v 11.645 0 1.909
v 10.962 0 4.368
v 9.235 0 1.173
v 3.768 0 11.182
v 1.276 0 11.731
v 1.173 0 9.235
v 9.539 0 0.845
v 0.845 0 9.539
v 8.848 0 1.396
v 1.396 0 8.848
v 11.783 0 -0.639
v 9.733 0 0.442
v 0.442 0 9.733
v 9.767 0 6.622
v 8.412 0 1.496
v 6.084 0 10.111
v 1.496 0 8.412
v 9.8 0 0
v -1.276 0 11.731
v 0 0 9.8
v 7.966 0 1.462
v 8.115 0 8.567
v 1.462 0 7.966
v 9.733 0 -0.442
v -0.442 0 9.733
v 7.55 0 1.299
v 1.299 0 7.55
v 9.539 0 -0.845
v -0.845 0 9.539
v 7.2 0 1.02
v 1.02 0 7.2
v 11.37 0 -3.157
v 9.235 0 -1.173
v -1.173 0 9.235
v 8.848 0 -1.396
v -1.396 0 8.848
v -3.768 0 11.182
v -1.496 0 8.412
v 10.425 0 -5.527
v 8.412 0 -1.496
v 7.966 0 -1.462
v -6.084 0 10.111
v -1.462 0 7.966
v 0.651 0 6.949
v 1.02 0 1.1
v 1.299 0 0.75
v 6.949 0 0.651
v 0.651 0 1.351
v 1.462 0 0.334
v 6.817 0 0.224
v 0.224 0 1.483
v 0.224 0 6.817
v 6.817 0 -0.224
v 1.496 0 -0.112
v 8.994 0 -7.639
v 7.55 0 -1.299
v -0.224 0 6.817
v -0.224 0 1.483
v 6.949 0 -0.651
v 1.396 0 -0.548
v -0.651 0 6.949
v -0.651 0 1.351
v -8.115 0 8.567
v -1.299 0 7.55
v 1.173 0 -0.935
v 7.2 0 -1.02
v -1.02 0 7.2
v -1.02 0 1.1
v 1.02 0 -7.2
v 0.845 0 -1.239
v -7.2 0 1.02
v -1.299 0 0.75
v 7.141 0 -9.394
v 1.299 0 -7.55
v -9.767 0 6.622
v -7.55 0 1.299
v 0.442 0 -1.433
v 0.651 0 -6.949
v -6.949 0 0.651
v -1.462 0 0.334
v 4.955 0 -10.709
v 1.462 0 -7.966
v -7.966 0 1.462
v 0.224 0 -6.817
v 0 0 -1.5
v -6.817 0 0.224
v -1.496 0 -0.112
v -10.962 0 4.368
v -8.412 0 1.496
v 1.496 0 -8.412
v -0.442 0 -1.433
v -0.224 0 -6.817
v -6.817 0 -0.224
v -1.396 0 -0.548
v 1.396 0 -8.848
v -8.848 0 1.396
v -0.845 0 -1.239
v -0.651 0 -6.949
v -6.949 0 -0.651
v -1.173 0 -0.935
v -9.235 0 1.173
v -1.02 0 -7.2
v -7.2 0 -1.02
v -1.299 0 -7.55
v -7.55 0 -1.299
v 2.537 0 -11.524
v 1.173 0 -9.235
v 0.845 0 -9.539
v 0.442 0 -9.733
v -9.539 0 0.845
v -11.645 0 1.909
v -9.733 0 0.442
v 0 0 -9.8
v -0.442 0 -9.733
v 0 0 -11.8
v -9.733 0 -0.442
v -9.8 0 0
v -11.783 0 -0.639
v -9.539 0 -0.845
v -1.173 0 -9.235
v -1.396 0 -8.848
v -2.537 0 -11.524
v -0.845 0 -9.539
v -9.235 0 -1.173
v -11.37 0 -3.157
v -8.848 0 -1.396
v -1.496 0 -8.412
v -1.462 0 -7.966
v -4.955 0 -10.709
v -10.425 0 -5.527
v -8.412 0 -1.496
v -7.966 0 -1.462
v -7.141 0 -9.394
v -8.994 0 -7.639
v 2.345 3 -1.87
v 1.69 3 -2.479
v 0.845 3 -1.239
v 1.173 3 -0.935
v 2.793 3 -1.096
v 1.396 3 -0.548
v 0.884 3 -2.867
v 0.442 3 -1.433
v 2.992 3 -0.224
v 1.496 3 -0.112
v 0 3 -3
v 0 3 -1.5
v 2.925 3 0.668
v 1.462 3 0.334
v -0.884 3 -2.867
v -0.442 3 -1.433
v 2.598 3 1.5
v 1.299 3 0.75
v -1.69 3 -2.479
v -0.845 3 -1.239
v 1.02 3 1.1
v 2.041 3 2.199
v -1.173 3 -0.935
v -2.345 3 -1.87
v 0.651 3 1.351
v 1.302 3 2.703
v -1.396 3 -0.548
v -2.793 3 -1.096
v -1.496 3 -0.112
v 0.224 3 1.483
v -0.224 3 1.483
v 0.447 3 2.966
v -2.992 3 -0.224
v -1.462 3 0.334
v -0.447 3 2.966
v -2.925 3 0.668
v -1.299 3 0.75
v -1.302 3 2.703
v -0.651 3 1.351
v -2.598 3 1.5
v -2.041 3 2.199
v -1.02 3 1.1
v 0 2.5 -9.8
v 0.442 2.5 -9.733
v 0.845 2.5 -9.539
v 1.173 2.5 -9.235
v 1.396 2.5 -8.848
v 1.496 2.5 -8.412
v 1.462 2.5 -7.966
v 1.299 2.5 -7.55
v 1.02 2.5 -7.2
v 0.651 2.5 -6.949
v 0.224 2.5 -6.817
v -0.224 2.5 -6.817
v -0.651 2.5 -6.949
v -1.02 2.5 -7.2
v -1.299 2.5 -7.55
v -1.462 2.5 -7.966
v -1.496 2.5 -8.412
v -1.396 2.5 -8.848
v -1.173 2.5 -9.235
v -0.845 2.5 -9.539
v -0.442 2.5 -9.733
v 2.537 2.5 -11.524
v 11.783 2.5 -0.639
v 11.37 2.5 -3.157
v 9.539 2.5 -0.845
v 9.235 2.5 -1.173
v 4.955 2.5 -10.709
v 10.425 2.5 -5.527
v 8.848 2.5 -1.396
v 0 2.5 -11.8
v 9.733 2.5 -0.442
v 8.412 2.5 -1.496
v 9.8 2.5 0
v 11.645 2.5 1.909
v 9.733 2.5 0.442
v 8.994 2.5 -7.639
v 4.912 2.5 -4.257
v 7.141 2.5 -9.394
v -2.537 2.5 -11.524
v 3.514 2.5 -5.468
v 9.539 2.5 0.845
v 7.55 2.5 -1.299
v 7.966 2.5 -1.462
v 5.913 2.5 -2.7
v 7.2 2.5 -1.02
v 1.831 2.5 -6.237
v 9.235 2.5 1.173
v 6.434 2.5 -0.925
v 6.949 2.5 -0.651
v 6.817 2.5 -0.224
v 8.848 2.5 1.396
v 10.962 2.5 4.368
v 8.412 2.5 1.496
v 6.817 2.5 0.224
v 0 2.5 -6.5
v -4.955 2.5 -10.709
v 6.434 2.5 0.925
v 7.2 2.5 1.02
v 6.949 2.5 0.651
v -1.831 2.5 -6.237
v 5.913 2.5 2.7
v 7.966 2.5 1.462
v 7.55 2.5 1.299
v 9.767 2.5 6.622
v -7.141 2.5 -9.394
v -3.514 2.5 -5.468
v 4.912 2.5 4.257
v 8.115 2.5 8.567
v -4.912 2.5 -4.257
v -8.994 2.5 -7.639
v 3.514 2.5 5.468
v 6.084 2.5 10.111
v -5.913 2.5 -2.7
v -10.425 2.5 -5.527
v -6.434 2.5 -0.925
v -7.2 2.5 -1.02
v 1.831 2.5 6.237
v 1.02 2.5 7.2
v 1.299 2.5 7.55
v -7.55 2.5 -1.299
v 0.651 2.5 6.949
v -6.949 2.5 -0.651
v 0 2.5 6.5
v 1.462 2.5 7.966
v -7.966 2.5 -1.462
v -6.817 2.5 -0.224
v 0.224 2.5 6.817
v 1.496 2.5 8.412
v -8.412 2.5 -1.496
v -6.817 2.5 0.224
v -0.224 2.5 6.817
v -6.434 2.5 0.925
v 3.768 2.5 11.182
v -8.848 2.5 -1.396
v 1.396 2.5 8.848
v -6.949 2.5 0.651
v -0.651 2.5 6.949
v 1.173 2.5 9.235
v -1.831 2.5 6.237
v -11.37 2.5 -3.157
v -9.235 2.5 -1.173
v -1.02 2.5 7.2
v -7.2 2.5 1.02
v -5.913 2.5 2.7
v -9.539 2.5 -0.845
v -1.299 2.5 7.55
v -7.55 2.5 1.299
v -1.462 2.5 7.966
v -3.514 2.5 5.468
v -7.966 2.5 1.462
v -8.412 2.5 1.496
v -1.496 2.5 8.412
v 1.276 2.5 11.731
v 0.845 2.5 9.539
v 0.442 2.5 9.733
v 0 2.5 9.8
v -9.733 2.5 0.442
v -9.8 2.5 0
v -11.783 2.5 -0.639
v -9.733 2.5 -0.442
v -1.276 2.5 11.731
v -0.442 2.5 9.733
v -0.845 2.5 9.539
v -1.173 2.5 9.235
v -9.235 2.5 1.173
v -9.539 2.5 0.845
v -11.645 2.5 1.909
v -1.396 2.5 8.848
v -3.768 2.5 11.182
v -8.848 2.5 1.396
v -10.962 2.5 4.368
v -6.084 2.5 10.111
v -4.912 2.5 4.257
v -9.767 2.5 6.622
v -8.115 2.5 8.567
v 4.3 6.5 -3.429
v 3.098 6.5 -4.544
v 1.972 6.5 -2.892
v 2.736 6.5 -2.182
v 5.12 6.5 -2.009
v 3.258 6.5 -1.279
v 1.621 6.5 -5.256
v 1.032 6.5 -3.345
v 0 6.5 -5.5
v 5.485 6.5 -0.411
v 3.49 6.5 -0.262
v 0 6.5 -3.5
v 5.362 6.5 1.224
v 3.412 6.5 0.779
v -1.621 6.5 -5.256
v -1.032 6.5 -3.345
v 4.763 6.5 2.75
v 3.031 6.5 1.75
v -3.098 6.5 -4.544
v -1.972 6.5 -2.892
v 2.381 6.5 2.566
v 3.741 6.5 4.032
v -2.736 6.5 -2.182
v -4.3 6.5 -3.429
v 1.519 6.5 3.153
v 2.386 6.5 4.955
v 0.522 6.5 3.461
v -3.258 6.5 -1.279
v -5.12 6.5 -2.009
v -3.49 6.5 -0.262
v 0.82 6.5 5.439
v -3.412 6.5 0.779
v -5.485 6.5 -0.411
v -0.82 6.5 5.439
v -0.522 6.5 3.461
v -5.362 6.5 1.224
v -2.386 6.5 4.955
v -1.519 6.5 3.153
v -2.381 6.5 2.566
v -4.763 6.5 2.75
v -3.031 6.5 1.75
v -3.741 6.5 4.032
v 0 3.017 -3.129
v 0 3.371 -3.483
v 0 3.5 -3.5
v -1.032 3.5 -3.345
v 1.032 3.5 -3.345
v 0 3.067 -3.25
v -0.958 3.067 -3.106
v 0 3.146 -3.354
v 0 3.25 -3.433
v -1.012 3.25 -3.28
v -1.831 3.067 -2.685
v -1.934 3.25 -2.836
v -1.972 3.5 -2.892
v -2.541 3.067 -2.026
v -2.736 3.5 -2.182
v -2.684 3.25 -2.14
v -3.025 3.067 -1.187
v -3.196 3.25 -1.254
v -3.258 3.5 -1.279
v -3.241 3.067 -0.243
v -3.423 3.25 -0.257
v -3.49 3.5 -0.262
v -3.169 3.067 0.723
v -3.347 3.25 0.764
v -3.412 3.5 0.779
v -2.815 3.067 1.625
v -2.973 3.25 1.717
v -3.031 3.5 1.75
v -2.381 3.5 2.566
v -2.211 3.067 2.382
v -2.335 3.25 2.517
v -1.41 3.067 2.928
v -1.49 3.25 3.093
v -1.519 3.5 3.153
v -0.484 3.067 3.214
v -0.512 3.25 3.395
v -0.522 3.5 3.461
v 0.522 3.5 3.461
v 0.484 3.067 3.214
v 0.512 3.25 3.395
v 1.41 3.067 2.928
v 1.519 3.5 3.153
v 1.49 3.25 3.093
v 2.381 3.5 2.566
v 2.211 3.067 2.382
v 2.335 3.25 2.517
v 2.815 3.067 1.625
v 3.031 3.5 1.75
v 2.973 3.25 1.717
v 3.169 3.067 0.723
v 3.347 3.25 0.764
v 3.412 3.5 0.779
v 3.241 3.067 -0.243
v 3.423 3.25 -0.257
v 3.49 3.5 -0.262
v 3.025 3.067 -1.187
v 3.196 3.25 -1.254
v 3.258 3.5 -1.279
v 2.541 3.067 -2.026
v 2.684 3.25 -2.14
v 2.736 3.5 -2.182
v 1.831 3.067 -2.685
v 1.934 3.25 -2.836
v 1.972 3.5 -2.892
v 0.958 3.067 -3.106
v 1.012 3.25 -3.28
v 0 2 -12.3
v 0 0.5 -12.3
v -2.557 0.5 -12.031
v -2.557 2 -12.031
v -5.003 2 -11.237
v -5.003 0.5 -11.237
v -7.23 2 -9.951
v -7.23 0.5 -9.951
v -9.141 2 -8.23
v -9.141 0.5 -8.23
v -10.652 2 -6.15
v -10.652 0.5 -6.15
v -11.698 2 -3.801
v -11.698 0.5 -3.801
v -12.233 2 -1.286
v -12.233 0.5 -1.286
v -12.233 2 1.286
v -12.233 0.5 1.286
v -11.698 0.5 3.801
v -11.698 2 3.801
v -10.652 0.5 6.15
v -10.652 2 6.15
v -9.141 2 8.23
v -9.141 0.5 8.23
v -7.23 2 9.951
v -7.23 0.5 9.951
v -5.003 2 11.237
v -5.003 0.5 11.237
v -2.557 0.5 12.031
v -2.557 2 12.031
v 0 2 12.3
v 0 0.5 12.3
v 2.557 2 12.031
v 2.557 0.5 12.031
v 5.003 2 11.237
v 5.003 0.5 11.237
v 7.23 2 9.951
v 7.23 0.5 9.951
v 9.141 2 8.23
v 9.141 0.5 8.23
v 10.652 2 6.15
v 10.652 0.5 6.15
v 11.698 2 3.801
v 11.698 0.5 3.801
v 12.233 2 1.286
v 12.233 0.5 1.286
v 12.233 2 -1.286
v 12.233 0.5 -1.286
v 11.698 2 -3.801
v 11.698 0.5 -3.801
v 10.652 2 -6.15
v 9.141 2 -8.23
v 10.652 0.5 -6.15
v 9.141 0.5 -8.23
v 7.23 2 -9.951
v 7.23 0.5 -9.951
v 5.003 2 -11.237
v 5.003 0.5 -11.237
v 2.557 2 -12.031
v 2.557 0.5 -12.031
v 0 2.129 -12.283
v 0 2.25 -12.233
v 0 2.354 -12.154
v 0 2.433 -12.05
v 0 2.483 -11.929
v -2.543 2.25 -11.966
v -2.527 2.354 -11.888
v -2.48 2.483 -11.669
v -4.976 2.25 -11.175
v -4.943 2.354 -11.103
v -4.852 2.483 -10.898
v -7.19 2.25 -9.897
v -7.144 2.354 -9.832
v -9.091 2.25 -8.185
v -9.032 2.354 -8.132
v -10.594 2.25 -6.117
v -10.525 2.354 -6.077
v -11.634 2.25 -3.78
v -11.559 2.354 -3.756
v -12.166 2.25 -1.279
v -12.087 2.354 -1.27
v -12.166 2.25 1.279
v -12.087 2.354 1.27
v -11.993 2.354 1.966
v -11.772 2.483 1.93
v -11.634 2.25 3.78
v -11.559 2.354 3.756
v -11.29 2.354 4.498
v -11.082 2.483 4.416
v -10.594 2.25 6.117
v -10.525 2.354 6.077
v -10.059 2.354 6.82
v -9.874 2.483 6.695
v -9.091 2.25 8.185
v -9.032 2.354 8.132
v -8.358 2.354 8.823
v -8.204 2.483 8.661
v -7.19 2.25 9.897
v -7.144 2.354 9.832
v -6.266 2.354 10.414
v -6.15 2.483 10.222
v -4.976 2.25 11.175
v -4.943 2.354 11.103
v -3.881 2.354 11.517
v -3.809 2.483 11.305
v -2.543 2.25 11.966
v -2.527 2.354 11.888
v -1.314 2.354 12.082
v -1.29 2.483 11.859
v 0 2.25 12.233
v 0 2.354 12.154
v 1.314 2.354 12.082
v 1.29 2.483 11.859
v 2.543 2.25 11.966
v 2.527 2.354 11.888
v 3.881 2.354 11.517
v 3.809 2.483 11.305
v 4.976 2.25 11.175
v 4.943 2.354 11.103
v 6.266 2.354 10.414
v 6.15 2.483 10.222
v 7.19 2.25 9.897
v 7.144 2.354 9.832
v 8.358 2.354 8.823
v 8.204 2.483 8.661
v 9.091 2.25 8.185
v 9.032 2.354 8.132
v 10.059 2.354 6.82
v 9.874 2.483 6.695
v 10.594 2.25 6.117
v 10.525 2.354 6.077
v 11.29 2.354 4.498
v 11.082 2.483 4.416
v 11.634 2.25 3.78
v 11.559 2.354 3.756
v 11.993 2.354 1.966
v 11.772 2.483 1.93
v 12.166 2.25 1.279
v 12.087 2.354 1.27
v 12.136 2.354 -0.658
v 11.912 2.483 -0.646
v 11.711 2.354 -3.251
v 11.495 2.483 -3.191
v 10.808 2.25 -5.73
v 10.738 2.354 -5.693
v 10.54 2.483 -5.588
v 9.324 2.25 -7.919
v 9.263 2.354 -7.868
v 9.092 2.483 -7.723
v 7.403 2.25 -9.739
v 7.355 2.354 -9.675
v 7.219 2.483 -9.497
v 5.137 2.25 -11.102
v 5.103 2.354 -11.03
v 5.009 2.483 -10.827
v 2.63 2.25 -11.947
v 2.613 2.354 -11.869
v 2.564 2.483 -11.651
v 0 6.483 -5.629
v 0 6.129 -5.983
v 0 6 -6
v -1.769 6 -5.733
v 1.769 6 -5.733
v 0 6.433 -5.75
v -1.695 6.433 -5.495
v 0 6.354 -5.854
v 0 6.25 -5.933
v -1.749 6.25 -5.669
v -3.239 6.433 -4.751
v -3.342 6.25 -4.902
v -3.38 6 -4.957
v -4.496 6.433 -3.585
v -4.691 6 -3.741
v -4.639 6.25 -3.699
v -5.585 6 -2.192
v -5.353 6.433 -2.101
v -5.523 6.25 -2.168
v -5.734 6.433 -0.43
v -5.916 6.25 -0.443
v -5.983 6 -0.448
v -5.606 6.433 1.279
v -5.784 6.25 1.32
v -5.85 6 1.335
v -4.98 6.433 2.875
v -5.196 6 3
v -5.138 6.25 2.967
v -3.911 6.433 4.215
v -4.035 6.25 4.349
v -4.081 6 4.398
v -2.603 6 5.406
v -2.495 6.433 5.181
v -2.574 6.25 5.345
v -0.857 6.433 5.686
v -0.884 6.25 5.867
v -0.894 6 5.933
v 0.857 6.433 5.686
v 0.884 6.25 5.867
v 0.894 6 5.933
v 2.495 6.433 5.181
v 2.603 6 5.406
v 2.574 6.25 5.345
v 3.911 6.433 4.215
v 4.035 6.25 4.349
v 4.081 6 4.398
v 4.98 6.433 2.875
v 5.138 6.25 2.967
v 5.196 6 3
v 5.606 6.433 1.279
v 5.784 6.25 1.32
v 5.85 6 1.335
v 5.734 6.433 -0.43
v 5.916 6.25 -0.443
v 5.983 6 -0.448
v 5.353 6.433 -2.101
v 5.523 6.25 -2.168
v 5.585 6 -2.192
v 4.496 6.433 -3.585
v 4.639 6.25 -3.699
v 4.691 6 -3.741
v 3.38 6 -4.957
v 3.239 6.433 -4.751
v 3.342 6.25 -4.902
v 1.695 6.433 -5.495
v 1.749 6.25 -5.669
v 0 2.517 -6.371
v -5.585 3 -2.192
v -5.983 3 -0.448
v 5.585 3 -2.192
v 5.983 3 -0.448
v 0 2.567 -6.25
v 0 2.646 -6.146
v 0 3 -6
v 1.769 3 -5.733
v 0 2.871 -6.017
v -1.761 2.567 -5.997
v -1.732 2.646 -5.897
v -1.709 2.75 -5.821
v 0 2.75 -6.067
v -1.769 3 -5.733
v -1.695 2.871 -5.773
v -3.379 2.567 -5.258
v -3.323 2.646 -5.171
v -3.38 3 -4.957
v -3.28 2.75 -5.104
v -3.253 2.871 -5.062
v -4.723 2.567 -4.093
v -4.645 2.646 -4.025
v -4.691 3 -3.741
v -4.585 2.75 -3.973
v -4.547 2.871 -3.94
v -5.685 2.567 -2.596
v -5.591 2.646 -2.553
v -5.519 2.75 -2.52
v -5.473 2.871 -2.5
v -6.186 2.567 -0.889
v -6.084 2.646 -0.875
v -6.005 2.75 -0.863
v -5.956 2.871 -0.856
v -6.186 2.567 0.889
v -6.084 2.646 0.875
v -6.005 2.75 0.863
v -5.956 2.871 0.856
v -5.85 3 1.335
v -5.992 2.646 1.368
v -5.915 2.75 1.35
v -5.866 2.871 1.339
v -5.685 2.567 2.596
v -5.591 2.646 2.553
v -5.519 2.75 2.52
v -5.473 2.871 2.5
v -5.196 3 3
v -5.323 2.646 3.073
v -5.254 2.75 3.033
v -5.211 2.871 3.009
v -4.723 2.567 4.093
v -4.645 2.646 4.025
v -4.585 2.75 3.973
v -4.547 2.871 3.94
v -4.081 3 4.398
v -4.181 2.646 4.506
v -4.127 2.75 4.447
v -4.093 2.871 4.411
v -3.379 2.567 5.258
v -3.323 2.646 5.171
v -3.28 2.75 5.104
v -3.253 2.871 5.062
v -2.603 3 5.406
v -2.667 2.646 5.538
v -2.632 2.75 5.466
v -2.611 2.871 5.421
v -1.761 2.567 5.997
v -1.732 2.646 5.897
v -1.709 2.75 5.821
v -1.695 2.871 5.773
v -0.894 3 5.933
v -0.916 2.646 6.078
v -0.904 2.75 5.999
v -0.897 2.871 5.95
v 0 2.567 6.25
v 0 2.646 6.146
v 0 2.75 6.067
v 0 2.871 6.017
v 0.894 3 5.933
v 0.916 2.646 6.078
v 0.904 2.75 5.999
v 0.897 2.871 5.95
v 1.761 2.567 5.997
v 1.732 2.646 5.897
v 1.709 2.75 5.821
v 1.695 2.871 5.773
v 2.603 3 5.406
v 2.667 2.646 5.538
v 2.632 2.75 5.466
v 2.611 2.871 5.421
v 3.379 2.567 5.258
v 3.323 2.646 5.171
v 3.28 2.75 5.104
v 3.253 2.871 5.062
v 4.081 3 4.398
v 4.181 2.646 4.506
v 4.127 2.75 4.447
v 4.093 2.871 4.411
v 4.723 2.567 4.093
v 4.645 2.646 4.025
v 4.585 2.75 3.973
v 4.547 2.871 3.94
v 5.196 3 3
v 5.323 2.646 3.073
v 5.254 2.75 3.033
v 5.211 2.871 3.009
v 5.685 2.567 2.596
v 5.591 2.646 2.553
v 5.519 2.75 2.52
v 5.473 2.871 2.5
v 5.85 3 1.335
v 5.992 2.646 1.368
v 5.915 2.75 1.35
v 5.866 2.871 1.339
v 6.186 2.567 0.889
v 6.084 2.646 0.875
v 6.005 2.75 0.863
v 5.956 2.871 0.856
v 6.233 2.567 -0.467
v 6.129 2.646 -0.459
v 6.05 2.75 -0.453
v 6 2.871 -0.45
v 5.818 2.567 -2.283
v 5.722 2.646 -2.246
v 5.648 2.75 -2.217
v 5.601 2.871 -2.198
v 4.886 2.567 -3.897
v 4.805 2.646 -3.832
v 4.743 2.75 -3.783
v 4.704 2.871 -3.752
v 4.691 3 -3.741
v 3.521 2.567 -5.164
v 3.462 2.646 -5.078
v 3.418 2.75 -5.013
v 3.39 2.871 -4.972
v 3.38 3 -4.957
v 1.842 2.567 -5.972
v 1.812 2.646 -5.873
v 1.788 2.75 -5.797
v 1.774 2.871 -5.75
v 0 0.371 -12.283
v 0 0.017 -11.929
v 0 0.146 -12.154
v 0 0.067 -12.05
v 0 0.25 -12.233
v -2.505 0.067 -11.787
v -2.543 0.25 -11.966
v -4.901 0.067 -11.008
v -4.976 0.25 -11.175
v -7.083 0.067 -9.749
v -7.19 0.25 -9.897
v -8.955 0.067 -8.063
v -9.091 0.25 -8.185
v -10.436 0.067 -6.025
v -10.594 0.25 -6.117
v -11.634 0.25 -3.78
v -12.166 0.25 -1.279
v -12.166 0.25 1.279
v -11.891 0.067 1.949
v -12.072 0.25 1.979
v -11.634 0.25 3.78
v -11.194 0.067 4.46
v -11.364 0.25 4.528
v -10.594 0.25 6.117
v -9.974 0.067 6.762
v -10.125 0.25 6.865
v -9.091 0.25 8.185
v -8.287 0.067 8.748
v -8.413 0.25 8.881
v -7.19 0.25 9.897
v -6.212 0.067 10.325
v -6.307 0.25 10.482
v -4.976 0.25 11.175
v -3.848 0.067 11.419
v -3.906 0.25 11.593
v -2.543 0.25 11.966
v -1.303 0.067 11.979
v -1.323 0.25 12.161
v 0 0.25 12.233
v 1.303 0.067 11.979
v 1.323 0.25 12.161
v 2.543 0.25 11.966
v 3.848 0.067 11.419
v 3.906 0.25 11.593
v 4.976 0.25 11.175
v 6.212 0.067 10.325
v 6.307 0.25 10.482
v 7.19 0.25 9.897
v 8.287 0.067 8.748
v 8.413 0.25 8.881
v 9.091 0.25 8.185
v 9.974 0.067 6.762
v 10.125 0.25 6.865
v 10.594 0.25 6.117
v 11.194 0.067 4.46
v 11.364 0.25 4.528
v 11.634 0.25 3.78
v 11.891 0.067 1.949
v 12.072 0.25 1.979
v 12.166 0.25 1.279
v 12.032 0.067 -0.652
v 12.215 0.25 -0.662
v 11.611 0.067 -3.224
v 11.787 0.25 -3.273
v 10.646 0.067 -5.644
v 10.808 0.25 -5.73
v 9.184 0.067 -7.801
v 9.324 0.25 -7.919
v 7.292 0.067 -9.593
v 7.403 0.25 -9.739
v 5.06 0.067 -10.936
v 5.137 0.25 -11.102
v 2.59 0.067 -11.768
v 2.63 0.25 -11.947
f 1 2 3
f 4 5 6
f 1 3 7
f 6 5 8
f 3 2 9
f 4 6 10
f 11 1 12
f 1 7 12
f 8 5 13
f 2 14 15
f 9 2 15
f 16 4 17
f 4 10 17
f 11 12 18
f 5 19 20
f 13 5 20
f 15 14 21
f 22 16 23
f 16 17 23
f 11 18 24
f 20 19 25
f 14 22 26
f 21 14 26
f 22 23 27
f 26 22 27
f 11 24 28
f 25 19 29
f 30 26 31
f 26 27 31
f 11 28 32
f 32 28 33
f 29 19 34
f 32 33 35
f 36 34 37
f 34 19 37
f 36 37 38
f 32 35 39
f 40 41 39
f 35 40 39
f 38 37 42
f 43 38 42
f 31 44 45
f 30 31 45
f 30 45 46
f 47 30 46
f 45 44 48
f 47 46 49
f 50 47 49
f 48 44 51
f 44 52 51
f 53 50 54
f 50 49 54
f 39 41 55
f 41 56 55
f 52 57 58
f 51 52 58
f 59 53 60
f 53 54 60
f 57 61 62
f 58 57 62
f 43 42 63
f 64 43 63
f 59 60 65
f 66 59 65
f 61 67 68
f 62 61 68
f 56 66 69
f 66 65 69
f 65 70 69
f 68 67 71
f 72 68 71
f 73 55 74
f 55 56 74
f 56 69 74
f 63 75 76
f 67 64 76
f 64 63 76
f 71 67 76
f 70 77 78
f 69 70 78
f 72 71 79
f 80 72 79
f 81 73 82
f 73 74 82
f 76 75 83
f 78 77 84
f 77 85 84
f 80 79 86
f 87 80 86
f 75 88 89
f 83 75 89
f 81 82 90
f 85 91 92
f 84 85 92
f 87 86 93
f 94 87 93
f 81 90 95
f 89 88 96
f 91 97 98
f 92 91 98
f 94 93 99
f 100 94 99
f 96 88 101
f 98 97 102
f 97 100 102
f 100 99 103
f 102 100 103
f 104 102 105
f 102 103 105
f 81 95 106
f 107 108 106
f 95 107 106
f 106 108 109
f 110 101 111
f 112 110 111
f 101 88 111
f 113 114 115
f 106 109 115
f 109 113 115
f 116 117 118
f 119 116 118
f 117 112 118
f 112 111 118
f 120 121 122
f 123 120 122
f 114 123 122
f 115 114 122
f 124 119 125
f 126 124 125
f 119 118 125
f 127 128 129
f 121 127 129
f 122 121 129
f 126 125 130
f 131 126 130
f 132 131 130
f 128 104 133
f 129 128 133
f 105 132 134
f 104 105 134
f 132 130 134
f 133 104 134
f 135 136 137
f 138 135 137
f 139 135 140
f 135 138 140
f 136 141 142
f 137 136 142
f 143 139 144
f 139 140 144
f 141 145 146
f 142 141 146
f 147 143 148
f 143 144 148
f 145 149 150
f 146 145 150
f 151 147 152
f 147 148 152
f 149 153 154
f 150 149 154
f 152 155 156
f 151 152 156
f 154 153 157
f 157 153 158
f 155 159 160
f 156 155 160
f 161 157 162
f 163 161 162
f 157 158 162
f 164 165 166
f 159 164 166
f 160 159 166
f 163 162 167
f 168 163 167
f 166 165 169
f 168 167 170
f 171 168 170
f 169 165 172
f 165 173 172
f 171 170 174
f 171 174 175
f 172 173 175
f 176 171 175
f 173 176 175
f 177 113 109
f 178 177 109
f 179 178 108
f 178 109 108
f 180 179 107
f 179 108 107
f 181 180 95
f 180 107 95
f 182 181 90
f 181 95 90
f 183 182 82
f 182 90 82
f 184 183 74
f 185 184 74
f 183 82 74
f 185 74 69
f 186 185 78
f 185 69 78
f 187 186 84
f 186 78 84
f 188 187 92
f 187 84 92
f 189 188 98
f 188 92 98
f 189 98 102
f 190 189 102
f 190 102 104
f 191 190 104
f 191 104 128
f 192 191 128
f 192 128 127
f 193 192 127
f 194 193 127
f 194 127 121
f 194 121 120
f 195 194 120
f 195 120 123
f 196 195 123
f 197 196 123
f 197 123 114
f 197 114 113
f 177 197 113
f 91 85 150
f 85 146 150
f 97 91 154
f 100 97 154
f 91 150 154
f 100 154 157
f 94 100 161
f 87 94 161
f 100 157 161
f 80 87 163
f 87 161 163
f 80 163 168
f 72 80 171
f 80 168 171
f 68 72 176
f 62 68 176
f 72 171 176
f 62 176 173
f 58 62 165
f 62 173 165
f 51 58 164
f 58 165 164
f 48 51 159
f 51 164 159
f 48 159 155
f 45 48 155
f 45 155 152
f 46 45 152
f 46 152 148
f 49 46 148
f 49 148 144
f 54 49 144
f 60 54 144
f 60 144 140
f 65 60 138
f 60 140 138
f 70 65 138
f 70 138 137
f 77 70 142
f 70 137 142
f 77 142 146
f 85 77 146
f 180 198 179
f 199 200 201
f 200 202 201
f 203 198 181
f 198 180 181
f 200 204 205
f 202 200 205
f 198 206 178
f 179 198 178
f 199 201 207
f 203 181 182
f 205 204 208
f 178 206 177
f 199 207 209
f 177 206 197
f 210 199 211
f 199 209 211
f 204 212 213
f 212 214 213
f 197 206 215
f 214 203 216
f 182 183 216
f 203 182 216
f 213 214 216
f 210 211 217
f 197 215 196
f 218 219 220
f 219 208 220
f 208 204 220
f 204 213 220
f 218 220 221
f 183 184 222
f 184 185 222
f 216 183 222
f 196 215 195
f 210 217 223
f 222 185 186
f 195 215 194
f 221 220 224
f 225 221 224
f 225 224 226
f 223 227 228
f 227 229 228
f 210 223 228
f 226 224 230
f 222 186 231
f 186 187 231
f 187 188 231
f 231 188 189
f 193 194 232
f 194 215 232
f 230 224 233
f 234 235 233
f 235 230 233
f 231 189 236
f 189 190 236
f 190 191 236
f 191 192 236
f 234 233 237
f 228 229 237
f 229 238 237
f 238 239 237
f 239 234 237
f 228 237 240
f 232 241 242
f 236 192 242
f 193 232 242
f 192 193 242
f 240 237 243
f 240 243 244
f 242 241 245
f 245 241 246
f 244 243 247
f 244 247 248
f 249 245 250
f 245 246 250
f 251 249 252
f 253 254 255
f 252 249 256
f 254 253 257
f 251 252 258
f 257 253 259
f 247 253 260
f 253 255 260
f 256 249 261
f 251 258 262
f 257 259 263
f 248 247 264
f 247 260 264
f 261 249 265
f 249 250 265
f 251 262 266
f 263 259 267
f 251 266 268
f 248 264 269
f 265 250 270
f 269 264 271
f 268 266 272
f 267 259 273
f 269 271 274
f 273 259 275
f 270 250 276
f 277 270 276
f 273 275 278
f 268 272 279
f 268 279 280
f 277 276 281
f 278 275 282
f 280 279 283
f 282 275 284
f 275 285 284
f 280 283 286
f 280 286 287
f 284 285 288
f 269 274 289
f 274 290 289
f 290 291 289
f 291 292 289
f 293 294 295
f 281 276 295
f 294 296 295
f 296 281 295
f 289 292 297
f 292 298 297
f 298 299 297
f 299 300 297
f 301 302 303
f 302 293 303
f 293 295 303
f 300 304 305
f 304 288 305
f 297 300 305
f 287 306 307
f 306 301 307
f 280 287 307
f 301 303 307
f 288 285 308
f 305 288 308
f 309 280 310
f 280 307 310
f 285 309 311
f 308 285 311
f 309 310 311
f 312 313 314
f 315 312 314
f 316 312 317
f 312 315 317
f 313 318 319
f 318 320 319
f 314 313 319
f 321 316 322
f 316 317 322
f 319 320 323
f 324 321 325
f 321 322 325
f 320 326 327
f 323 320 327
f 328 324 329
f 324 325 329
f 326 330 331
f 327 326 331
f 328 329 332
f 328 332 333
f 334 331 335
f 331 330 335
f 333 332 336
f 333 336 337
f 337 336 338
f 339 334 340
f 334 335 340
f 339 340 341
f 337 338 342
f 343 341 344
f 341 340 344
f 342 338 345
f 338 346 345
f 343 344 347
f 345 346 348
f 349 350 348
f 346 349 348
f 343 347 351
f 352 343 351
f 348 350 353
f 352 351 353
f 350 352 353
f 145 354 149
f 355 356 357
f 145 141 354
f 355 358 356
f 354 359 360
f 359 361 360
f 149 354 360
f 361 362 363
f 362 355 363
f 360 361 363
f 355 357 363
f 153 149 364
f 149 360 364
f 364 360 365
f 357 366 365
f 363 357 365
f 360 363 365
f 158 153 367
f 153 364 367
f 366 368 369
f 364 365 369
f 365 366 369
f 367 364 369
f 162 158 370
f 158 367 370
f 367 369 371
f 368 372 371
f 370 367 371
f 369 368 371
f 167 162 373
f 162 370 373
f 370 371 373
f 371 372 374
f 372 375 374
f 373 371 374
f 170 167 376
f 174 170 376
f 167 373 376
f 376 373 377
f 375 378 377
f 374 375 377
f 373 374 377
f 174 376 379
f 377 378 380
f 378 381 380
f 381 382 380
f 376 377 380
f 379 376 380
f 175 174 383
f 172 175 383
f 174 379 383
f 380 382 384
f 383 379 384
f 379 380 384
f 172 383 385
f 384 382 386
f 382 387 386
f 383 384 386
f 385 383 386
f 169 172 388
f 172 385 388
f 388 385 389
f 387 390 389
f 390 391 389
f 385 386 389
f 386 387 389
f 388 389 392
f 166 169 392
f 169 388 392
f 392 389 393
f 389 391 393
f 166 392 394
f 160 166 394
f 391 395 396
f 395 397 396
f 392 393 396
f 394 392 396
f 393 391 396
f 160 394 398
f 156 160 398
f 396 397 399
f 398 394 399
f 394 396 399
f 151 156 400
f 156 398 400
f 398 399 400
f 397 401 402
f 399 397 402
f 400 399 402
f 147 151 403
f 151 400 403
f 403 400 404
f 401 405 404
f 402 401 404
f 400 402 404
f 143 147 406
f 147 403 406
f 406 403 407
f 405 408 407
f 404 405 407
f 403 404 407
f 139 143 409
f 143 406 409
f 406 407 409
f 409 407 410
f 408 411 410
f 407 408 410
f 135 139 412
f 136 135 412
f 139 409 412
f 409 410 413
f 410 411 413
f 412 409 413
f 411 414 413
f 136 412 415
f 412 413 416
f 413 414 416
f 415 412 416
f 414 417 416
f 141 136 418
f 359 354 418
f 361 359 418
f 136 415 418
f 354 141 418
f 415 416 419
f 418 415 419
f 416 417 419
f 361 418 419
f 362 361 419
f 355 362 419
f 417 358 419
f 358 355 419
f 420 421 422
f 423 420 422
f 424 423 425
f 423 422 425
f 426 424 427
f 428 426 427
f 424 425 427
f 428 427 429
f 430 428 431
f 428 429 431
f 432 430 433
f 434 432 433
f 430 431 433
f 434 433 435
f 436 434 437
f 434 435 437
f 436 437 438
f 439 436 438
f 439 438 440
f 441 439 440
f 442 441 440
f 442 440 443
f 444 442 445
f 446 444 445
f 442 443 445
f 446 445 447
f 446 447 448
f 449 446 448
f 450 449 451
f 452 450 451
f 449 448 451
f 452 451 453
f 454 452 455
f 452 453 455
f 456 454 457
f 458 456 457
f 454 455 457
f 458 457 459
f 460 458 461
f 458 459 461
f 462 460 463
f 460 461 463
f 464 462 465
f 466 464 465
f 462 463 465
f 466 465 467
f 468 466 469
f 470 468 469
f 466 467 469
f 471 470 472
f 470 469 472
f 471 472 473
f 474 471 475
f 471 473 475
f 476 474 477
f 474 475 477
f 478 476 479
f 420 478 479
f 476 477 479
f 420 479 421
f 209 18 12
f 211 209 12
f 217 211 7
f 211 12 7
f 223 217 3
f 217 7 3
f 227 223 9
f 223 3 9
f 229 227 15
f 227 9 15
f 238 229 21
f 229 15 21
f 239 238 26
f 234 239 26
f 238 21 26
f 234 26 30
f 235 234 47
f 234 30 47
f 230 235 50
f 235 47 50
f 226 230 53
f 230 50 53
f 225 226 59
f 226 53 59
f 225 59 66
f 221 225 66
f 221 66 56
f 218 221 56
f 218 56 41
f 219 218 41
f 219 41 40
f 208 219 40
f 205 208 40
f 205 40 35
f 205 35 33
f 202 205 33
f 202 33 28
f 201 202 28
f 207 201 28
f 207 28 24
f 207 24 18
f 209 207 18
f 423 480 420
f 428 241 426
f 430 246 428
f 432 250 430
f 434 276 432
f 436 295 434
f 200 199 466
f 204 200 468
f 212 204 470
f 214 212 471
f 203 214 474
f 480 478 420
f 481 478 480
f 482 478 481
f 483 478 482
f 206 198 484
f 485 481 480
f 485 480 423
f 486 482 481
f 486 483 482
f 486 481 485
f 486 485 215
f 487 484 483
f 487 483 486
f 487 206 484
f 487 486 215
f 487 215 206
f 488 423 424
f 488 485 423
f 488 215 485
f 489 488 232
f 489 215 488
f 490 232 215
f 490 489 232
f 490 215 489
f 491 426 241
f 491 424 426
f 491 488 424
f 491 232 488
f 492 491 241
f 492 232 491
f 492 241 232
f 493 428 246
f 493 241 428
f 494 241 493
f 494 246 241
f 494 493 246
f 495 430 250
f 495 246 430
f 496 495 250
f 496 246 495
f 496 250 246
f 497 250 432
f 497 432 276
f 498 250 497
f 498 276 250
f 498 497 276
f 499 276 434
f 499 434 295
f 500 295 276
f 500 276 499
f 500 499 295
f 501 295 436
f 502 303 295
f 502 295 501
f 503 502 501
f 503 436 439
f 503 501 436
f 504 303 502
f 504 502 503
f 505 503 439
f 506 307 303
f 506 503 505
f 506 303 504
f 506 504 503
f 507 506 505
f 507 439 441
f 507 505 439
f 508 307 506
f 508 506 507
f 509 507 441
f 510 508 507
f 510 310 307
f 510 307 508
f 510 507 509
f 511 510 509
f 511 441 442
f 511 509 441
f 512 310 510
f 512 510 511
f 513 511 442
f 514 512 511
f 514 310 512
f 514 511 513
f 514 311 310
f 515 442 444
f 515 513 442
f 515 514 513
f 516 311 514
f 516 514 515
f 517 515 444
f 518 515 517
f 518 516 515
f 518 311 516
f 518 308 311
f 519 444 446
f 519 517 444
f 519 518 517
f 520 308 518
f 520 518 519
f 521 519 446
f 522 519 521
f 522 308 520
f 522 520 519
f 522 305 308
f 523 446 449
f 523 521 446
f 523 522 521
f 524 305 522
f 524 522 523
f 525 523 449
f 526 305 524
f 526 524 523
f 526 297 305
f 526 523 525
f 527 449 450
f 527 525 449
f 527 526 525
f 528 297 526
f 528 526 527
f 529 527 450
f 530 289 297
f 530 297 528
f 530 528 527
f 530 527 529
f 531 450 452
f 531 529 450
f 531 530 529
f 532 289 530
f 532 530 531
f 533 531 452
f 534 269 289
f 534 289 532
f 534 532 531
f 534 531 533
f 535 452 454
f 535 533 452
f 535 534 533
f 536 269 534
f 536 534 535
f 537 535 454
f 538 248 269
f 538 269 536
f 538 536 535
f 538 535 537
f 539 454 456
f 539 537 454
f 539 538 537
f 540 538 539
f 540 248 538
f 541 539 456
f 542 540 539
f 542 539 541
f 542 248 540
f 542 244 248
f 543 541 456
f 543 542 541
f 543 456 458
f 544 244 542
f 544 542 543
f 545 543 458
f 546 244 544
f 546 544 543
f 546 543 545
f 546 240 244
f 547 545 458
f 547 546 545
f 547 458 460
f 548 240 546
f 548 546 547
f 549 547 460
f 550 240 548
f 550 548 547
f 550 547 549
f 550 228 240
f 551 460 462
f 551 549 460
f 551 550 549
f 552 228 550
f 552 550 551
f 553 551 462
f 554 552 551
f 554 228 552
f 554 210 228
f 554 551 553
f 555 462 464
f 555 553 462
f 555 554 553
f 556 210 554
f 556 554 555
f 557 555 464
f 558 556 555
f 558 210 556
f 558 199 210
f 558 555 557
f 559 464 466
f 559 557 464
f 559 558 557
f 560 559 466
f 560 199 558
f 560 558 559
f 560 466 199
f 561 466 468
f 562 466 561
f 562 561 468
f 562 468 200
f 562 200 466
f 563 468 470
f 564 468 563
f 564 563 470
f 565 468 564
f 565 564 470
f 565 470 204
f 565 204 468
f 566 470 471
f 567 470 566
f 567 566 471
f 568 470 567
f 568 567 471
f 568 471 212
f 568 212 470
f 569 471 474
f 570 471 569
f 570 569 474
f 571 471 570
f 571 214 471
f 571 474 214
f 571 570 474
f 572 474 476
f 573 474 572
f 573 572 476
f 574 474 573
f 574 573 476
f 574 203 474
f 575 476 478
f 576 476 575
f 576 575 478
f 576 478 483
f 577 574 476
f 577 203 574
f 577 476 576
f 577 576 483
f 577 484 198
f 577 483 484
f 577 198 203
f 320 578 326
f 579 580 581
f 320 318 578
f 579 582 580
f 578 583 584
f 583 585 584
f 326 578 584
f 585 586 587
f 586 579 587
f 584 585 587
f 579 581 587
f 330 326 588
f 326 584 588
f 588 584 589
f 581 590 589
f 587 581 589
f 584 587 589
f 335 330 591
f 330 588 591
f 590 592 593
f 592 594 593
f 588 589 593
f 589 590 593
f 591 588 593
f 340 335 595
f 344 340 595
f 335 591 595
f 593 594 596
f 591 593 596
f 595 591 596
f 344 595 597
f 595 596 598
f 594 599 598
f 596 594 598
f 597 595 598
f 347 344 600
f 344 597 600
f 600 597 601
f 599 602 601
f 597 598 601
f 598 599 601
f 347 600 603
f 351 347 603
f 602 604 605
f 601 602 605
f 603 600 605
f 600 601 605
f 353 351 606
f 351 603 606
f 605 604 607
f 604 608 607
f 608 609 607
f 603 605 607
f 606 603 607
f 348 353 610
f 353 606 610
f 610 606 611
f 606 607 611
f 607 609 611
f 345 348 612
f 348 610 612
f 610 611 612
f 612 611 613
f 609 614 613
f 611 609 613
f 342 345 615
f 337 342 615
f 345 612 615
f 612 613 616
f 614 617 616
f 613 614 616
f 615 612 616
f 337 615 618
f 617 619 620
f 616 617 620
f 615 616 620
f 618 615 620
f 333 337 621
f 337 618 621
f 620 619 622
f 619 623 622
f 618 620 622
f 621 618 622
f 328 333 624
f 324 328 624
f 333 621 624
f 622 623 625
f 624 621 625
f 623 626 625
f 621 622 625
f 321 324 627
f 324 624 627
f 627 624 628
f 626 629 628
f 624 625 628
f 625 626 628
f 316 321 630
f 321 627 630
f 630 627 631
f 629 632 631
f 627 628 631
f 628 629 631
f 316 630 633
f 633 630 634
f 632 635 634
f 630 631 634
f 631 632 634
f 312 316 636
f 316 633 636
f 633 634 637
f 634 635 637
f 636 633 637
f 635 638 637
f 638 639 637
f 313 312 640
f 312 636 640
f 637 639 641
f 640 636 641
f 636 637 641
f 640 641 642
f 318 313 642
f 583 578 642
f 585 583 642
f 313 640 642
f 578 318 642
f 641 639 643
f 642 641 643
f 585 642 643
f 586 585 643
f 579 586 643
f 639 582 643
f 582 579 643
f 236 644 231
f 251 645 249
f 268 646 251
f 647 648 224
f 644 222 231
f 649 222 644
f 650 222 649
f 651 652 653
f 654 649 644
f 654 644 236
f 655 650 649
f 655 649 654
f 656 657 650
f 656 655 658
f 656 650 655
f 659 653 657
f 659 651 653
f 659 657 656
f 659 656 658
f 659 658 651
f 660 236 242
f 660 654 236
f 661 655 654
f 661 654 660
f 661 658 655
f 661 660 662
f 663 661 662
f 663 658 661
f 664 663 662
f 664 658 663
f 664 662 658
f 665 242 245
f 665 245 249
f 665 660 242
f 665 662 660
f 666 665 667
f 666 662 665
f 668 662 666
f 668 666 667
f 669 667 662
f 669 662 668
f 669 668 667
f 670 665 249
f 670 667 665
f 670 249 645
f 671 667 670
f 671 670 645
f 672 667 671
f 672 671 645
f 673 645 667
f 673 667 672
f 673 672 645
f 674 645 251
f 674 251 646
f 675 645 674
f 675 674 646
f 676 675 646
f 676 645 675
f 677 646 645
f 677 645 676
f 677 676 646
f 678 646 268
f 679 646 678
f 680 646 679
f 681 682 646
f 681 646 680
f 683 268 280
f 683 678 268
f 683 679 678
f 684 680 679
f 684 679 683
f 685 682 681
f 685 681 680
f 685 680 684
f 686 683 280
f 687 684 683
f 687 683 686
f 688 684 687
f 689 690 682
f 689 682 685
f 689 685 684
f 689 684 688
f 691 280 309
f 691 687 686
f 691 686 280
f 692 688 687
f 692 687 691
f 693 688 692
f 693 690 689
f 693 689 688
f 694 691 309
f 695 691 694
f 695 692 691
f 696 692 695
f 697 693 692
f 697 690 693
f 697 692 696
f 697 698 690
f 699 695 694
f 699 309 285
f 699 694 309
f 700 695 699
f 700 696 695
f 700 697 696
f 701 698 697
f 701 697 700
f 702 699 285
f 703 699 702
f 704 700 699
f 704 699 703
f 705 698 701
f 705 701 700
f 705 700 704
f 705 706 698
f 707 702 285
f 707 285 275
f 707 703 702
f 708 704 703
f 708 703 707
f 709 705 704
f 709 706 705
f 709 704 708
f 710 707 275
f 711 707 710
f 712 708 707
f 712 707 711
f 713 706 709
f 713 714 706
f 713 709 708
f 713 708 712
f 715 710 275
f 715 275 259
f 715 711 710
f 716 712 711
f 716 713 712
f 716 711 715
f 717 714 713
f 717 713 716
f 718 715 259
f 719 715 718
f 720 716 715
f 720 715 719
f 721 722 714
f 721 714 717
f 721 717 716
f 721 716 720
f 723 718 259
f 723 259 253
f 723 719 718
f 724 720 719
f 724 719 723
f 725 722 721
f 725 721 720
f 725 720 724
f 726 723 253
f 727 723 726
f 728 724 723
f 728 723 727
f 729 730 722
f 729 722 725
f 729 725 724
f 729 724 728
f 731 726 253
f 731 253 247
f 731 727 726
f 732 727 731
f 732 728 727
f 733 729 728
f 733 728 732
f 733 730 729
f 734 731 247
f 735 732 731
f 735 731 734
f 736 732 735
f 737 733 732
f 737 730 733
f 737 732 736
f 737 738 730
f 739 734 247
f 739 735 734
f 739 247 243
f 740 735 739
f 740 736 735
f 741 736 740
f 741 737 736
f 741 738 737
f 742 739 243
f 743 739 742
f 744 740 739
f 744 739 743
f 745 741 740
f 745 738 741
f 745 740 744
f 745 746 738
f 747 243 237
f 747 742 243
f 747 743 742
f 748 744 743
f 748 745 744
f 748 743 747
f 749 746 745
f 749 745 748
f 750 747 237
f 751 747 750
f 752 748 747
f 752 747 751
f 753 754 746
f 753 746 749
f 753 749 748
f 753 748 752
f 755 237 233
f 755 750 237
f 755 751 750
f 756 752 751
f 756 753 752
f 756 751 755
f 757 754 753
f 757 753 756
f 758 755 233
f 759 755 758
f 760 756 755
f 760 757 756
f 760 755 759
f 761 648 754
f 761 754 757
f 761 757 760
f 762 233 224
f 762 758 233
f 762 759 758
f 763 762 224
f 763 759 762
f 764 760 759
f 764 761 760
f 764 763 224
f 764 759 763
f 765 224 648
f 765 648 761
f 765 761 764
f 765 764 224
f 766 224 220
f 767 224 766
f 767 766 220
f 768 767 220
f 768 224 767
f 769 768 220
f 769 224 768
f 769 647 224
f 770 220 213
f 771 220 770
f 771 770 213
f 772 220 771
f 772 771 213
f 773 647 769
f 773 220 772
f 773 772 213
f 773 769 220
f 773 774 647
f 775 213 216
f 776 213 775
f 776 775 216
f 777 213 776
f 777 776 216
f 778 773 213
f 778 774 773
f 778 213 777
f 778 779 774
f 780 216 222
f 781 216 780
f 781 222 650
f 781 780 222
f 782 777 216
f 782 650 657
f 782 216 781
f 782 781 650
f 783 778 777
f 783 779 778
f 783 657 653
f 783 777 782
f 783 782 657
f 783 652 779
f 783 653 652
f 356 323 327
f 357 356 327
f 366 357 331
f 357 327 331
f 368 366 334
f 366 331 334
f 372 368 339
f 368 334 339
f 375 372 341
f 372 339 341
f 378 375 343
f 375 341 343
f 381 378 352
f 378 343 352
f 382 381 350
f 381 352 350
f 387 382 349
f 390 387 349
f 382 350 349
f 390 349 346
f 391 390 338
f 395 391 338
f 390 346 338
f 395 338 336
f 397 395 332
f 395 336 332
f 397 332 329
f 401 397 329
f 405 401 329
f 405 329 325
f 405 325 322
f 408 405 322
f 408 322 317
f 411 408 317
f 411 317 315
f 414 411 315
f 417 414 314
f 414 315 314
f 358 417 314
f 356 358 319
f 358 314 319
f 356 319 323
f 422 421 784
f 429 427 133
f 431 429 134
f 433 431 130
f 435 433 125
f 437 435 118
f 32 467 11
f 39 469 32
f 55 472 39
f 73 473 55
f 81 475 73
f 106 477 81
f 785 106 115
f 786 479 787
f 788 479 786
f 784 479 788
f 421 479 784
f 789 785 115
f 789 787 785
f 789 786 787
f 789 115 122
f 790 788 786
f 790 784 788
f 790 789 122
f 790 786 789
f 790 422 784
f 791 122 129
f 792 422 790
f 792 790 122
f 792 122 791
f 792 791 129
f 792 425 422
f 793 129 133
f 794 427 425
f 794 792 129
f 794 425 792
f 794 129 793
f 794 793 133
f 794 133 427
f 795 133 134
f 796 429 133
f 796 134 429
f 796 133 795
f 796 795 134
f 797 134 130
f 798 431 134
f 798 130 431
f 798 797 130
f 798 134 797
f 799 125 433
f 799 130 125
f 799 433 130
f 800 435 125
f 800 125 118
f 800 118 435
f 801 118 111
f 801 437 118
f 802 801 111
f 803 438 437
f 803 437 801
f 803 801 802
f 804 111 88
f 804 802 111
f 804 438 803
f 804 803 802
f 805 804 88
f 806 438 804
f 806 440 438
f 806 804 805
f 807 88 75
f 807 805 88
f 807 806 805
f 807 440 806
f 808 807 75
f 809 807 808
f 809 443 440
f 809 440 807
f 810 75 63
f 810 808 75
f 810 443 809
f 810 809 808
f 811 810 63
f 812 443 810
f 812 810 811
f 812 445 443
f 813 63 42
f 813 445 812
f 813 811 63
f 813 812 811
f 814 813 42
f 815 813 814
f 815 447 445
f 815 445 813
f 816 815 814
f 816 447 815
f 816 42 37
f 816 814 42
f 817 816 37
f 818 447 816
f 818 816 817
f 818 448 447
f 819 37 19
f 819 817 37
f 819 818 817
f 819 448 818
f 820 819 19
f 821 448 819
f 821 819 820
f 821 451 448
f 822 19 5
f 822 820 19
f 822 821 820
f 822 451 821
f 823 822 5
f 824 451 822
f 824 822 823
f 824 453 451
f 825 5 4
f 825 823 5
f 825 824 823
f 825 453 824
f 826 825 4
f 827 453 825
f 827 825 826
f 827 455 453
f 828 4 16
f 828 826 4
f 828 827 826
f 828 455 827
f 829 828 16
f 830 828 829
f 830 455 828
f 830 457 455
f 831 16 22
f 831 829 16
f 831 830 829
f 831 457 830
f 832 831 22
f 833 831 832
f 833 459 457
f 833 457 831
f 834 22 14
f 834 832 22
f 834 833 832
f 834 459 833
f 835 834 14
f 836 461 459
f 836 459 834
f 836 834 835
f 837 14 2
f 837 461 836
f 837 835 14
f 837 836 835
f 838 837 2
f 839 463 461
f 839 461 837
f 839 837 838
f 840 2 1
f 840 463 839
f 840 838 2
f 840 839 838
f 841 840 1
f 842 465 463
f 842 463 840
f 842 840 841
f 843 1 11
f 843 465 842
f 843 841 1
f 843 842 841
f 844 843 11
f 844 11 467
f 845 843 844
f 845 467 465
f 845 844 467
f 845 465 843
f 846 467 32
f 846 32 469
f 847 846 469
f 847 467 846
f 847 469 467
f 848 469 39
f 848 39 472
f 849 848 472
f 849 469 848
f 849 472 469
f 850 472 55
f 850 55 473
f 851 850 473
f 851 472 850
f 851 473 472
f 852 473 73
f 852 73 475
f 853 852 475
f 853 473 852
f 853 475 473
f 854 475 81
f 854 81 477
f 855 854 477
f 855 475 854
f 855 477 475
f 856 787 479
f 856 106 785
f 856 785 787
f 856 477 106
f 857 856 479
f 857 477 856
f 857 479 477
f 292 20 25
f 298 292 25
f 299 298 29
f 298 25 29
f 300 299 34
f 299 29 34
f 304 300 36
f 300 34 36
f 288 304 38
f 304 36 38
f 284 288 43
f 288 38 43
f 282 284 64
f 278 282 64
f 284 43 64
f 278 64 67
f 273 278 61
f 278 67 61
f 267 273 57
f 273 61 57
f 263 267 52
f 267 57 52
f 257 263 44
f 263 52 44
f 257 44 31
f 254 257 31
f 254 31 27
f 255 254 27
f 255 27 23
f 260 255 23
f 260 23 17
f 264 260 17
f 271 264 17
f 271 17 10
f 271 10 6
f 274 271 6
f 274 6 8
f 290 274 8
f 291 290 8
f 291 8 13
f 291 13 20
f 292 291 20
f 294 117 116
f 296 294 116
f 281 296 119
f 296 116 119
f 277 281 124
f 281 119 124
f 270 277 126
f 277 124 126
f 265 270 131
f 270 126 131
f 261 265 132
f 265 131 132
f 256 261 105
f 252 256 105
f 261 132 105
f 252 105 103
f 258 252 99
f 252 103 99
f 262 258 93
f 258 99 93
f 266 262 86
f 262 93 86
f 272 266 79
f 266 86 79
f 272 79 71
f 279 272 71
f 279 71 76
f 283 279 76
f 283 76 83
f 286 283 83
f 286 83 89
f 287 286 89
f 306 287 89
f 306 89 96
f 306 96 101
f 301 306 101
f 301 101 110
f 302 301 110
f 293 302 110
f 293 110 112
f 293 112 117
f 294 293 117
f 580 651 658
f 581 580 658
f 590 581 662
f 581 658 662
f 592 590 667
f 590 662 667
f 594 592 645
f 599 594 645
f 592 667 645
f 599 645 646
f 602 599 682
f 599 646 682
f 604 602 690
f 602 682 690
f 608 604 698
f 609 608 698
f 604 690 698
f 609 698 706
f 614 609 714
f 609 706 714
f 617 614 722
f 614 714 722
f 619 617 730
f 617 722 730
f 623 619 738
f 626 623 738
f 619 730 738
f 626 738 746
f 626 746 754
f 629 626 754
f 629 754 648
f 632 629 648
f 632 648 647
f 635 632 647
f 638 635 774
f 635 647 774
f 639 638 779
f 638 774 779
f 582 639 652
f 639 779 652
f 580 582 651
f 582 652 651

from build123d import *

# Parameters (mm, degrees)
SKETCH2_R          = 1.5
CUT_EXTRUDE1_DEPTH = 10
CIRPATTERN1_COUNT  = 4
FILLET1_R          = 0.5


with BuildPart() as part:
    # Sketch1 → Revolve1 (revolve)
    with BuildSketch(Plane(origin=(0, 0, 0), x_dir=(0, 0, -1), z_dir=(1, 0, 0))):
        Polygon((1.5, 0), (1.5, 3), (3.5, 3), (3.5, 6.5), (6, 6.5), (6, 2.5), (12.3, 2.5), (12.3, 0), align=None)
    revolve(axis=Axis((0, -5.736482489, 0), (0, 1, 0)))

    # Sketch2 → Cut-Extrude1 (cut)
    with BuildSketch(Plane.XZ):
        with Locations(Location((0, -8.3, 0), (0, 0, 270))):
            Circle(SKETCH2_R)
    cut_extrude1 = extrude(amount=-CUT_EXTRUDE1_DEPTH, mode=Mode.SUBTRACT)

    # CirPattern1: Cut-Extrude1 ×4 about axis
    cirpattern1_axis = Axis((0, 0, 0), (0, 1, 0))
    for i in range(1, CIRPATTERN1_COUNT):
        add(cut_extrude1.rotate(cirpattern1_axis, i * 360 / CIRPATTERN1_COUNT), mode=Mode.SUBTRACT)

    # Fillet1
    fillet1_edges = [part.edges().sort_by_distance(p)[0] for p in [
        (0, 0, 12.3),
        (0, 2.5, 12.3),
        (0, 2.5, 6),
        (0, 6.5, 6),
        (0, 3, 3.5),
    ]]
    fillet(fillet1_edges, radius=FILLET1_R)


solid = part.part
